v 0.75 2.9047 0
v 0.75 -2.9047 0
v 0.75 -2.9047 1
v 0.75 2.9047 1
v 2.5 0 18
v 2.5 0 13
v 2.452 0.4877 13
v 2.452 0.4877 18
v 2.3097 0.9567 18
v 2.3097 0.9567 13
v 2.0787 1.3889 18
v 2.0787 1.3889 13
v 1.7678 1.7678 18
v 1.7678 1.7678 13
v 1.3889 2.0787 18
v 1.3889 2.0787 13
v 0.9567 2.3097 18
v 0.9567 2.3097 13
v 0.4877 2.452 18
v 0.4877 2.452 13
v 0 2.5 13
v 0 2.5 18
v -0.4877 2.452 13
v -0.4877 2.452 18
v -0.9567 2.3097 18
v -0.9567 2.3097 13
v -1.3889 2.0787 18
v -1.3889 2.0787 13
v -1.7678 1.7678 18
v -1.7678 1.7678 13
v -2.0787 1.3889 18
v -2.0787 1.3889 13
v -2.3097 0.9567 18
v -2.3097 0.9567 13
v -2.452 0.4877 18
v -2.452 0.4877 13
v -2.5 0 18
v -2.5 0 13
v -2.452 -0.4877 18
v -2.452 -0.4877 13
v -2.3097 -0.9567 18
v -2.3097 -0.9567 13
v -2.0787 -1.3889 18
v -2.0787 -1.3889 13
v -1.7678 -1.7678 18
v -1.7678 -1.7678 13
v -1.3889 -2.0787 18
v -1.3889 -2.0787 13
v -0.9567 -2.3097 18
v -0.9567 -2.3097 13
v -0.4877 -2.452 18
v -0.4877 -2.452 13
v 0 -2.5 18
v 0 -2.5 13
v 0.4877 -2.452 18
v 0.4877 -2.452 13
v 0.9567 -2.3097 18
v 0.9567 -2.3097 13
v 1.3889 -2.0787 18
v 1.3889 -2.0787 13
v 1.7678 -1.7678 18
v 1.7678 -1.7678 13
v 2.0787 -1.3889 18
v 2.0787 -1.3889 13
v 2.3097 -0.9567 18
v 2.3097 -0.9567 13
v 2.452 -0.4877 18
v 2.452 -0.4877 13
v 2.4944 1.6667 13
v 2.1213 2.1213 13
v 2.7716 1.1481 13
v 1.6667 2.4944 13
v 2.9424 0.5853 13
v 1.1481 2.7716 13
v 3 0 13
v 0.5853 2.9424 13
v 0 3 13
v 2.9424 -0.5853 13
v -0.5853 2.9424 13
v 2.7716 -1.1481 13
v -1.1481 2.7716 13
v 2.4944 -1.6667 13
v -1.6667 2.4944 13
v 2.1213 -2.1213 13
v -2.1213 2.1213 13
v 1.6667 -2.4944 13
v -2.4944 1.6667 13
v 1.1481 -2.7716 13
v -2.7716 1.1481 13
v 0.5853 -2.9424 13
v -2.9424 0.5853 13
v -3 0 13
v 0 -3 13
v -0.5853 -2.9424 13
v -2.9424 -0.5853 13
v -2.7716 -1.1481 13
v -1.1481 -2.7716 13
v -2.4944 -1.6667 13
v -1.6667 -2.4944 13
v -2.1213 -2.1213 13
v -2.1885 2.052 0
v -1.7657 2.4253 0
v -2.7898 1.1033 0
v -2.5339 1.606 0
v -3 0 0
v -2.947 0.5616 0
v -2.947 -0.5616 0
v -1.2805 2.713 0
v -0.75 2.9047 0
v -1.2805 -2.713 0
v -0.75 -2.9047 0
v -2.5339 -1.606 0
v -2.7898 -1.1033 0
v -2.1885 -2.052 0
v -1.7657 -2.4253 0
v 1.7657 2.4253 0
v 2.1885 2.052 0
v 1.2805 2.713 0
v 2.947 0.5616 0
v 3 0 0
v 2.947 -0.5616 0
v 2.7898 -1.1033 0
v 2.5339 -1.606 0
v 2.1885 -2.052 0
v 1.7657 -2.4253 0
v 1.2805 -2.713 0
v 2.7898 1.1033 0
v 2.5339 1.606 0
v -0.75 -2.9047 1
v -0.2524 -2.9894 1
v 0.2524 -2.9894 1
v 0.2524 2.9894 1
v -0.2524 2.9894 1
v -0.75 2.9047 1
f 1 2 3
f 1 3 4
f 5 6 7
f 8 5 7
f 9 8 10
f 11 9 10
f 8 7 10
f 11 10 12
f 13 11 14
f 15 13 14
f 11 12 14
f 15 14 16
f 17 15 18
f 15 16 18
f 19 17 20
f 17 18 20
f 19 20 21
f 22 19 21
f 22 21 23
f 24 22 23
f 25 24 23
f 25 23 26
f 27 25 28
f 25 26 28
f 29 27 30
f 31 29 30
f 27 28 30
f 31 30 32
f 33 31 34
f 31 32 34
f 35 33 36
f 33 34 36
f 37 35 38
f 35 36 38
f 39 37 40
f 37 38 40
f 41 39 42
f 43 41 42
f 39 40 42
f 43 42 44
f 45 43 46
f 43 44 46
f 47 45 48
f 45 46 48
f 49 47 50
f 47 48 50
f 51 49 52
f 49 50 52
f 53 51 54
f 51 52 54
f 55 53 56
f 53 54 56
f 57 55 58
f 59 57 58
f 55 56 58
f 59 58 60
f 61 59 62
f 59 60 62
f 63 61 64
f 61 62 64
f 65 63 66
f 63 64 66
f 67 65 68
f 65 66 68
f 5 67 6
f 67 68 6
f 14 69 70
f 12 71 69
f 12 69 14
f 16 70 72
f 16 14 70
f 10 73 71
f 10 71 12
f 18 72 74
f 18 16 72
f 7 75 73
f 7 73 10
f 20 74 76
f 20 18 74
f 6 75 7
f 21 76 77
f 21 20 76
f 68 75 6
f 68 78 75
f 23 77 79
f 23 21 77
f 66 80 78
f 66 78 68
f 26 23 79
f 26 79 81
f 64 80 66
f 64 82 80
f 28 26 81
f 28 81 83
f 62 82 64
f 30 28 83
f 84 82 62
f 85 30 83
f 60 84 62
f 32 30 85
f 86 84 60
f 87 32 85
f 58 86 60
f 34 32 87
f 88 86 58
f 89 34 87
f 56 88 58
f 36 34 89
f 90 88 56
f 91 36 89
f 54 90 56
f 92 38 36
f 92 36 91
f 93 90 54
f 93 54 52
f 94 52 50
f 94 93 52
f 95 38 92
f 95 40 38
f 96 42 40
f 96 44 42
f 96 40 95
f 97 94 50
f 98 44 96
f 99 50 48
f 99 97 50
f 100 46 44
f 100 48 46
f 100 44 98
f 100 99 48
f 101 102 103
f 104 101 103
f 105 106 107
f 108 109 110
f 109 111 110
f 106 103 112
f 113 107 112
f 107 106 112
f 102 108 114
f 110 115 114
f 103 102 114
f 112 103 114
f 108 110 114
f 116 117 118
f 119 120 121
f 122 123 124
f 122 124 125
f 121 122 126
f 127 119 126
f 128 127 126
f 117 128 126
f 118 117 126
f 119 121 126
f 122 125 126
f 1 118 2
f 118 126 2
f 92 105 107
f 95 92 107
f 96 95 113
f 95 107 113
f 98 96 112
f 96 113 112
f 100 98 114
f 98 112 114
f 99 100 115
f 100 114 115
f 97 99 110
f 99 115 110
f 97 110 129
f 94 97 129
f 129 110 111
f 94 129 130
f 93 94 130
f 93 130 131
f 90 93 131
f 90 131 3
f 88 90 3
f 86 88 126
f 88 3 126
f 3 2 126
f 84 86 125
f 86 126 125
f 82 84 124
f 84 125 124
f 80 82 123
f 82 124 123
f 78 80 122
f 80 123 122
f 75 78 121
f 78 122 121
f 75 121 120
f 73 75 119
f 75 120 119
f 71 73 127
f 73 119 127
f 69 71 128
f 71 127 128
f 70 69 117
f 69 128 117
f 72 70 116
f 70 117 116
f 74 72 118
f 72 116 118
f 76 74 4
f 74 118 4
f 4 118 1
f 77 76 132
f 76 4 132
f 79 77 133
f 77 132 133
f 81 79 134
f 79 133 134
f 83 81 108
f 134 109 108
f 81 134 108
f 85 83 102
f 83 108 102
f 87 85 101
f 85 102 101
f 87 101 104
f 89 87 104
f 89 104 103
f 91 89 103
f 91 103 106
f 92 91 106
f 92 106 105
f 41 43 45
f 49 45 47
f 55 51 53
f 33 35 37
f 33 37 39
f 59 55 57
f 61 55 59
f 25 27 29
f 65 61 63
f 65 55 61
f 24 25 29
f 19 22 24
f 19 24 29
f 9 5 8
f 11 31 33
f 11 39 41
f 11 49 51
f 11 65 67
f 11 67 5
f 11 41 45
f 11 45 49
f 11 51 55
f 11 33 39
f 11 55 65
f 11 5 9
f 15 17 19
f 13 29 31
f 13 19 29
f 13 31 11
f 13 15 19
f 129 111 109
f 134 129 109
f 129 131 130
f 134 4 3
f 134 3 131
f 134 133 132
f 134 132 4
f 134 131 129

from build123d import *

# Parameters (mm, degrees)
SKETCH_1_R          = 3
EXTRUDE_1_DEPTH     = 13
SKETCH_2_R          = 2.5
EXTRUDE_2_DEPTH     = 5
SKETCH_3_W          = 1.5
SKETCH_3_H          = 7.126757192
CUT_EXTRUDE_1_DEPTH = 1


with BuildPart() as part:
    # Эскиз1 → Бобышка-Вытянуть1 (new body)
    with BuildSketch(Plane.XY):
        with Locations(Location((0, 0, 0), (0, 0, 180))):
            Circle(SKETCH_1_R)
    extrude(amount=EXTRUDE_1_DEPTH)

    # Эскиз2 → Бобышка-Вытянуть2 (add)
    with BuildSketch(Plane.XY.offset(13)):
        Circle(SKETCH_2_R)
    extrude(amount=EXTRUDE_2_DEPTH)

    # Эскиз3 → Вырез-Вытянуть1 (cut)
    with BuildSketch(Plane(origin=(0, 0, 0), x_dir=(-1, 0, 0), z_dir=(0, 0, -1))):
        with Locations((0, 0.049491369)):
            Rectangle(SKETCH_3_W, SKETCH_3_H)
    extrude(amount=-CUT_EXTRUDE_1_DEPTH, mode=Mode.SUBTRACT)


solid = part.part
